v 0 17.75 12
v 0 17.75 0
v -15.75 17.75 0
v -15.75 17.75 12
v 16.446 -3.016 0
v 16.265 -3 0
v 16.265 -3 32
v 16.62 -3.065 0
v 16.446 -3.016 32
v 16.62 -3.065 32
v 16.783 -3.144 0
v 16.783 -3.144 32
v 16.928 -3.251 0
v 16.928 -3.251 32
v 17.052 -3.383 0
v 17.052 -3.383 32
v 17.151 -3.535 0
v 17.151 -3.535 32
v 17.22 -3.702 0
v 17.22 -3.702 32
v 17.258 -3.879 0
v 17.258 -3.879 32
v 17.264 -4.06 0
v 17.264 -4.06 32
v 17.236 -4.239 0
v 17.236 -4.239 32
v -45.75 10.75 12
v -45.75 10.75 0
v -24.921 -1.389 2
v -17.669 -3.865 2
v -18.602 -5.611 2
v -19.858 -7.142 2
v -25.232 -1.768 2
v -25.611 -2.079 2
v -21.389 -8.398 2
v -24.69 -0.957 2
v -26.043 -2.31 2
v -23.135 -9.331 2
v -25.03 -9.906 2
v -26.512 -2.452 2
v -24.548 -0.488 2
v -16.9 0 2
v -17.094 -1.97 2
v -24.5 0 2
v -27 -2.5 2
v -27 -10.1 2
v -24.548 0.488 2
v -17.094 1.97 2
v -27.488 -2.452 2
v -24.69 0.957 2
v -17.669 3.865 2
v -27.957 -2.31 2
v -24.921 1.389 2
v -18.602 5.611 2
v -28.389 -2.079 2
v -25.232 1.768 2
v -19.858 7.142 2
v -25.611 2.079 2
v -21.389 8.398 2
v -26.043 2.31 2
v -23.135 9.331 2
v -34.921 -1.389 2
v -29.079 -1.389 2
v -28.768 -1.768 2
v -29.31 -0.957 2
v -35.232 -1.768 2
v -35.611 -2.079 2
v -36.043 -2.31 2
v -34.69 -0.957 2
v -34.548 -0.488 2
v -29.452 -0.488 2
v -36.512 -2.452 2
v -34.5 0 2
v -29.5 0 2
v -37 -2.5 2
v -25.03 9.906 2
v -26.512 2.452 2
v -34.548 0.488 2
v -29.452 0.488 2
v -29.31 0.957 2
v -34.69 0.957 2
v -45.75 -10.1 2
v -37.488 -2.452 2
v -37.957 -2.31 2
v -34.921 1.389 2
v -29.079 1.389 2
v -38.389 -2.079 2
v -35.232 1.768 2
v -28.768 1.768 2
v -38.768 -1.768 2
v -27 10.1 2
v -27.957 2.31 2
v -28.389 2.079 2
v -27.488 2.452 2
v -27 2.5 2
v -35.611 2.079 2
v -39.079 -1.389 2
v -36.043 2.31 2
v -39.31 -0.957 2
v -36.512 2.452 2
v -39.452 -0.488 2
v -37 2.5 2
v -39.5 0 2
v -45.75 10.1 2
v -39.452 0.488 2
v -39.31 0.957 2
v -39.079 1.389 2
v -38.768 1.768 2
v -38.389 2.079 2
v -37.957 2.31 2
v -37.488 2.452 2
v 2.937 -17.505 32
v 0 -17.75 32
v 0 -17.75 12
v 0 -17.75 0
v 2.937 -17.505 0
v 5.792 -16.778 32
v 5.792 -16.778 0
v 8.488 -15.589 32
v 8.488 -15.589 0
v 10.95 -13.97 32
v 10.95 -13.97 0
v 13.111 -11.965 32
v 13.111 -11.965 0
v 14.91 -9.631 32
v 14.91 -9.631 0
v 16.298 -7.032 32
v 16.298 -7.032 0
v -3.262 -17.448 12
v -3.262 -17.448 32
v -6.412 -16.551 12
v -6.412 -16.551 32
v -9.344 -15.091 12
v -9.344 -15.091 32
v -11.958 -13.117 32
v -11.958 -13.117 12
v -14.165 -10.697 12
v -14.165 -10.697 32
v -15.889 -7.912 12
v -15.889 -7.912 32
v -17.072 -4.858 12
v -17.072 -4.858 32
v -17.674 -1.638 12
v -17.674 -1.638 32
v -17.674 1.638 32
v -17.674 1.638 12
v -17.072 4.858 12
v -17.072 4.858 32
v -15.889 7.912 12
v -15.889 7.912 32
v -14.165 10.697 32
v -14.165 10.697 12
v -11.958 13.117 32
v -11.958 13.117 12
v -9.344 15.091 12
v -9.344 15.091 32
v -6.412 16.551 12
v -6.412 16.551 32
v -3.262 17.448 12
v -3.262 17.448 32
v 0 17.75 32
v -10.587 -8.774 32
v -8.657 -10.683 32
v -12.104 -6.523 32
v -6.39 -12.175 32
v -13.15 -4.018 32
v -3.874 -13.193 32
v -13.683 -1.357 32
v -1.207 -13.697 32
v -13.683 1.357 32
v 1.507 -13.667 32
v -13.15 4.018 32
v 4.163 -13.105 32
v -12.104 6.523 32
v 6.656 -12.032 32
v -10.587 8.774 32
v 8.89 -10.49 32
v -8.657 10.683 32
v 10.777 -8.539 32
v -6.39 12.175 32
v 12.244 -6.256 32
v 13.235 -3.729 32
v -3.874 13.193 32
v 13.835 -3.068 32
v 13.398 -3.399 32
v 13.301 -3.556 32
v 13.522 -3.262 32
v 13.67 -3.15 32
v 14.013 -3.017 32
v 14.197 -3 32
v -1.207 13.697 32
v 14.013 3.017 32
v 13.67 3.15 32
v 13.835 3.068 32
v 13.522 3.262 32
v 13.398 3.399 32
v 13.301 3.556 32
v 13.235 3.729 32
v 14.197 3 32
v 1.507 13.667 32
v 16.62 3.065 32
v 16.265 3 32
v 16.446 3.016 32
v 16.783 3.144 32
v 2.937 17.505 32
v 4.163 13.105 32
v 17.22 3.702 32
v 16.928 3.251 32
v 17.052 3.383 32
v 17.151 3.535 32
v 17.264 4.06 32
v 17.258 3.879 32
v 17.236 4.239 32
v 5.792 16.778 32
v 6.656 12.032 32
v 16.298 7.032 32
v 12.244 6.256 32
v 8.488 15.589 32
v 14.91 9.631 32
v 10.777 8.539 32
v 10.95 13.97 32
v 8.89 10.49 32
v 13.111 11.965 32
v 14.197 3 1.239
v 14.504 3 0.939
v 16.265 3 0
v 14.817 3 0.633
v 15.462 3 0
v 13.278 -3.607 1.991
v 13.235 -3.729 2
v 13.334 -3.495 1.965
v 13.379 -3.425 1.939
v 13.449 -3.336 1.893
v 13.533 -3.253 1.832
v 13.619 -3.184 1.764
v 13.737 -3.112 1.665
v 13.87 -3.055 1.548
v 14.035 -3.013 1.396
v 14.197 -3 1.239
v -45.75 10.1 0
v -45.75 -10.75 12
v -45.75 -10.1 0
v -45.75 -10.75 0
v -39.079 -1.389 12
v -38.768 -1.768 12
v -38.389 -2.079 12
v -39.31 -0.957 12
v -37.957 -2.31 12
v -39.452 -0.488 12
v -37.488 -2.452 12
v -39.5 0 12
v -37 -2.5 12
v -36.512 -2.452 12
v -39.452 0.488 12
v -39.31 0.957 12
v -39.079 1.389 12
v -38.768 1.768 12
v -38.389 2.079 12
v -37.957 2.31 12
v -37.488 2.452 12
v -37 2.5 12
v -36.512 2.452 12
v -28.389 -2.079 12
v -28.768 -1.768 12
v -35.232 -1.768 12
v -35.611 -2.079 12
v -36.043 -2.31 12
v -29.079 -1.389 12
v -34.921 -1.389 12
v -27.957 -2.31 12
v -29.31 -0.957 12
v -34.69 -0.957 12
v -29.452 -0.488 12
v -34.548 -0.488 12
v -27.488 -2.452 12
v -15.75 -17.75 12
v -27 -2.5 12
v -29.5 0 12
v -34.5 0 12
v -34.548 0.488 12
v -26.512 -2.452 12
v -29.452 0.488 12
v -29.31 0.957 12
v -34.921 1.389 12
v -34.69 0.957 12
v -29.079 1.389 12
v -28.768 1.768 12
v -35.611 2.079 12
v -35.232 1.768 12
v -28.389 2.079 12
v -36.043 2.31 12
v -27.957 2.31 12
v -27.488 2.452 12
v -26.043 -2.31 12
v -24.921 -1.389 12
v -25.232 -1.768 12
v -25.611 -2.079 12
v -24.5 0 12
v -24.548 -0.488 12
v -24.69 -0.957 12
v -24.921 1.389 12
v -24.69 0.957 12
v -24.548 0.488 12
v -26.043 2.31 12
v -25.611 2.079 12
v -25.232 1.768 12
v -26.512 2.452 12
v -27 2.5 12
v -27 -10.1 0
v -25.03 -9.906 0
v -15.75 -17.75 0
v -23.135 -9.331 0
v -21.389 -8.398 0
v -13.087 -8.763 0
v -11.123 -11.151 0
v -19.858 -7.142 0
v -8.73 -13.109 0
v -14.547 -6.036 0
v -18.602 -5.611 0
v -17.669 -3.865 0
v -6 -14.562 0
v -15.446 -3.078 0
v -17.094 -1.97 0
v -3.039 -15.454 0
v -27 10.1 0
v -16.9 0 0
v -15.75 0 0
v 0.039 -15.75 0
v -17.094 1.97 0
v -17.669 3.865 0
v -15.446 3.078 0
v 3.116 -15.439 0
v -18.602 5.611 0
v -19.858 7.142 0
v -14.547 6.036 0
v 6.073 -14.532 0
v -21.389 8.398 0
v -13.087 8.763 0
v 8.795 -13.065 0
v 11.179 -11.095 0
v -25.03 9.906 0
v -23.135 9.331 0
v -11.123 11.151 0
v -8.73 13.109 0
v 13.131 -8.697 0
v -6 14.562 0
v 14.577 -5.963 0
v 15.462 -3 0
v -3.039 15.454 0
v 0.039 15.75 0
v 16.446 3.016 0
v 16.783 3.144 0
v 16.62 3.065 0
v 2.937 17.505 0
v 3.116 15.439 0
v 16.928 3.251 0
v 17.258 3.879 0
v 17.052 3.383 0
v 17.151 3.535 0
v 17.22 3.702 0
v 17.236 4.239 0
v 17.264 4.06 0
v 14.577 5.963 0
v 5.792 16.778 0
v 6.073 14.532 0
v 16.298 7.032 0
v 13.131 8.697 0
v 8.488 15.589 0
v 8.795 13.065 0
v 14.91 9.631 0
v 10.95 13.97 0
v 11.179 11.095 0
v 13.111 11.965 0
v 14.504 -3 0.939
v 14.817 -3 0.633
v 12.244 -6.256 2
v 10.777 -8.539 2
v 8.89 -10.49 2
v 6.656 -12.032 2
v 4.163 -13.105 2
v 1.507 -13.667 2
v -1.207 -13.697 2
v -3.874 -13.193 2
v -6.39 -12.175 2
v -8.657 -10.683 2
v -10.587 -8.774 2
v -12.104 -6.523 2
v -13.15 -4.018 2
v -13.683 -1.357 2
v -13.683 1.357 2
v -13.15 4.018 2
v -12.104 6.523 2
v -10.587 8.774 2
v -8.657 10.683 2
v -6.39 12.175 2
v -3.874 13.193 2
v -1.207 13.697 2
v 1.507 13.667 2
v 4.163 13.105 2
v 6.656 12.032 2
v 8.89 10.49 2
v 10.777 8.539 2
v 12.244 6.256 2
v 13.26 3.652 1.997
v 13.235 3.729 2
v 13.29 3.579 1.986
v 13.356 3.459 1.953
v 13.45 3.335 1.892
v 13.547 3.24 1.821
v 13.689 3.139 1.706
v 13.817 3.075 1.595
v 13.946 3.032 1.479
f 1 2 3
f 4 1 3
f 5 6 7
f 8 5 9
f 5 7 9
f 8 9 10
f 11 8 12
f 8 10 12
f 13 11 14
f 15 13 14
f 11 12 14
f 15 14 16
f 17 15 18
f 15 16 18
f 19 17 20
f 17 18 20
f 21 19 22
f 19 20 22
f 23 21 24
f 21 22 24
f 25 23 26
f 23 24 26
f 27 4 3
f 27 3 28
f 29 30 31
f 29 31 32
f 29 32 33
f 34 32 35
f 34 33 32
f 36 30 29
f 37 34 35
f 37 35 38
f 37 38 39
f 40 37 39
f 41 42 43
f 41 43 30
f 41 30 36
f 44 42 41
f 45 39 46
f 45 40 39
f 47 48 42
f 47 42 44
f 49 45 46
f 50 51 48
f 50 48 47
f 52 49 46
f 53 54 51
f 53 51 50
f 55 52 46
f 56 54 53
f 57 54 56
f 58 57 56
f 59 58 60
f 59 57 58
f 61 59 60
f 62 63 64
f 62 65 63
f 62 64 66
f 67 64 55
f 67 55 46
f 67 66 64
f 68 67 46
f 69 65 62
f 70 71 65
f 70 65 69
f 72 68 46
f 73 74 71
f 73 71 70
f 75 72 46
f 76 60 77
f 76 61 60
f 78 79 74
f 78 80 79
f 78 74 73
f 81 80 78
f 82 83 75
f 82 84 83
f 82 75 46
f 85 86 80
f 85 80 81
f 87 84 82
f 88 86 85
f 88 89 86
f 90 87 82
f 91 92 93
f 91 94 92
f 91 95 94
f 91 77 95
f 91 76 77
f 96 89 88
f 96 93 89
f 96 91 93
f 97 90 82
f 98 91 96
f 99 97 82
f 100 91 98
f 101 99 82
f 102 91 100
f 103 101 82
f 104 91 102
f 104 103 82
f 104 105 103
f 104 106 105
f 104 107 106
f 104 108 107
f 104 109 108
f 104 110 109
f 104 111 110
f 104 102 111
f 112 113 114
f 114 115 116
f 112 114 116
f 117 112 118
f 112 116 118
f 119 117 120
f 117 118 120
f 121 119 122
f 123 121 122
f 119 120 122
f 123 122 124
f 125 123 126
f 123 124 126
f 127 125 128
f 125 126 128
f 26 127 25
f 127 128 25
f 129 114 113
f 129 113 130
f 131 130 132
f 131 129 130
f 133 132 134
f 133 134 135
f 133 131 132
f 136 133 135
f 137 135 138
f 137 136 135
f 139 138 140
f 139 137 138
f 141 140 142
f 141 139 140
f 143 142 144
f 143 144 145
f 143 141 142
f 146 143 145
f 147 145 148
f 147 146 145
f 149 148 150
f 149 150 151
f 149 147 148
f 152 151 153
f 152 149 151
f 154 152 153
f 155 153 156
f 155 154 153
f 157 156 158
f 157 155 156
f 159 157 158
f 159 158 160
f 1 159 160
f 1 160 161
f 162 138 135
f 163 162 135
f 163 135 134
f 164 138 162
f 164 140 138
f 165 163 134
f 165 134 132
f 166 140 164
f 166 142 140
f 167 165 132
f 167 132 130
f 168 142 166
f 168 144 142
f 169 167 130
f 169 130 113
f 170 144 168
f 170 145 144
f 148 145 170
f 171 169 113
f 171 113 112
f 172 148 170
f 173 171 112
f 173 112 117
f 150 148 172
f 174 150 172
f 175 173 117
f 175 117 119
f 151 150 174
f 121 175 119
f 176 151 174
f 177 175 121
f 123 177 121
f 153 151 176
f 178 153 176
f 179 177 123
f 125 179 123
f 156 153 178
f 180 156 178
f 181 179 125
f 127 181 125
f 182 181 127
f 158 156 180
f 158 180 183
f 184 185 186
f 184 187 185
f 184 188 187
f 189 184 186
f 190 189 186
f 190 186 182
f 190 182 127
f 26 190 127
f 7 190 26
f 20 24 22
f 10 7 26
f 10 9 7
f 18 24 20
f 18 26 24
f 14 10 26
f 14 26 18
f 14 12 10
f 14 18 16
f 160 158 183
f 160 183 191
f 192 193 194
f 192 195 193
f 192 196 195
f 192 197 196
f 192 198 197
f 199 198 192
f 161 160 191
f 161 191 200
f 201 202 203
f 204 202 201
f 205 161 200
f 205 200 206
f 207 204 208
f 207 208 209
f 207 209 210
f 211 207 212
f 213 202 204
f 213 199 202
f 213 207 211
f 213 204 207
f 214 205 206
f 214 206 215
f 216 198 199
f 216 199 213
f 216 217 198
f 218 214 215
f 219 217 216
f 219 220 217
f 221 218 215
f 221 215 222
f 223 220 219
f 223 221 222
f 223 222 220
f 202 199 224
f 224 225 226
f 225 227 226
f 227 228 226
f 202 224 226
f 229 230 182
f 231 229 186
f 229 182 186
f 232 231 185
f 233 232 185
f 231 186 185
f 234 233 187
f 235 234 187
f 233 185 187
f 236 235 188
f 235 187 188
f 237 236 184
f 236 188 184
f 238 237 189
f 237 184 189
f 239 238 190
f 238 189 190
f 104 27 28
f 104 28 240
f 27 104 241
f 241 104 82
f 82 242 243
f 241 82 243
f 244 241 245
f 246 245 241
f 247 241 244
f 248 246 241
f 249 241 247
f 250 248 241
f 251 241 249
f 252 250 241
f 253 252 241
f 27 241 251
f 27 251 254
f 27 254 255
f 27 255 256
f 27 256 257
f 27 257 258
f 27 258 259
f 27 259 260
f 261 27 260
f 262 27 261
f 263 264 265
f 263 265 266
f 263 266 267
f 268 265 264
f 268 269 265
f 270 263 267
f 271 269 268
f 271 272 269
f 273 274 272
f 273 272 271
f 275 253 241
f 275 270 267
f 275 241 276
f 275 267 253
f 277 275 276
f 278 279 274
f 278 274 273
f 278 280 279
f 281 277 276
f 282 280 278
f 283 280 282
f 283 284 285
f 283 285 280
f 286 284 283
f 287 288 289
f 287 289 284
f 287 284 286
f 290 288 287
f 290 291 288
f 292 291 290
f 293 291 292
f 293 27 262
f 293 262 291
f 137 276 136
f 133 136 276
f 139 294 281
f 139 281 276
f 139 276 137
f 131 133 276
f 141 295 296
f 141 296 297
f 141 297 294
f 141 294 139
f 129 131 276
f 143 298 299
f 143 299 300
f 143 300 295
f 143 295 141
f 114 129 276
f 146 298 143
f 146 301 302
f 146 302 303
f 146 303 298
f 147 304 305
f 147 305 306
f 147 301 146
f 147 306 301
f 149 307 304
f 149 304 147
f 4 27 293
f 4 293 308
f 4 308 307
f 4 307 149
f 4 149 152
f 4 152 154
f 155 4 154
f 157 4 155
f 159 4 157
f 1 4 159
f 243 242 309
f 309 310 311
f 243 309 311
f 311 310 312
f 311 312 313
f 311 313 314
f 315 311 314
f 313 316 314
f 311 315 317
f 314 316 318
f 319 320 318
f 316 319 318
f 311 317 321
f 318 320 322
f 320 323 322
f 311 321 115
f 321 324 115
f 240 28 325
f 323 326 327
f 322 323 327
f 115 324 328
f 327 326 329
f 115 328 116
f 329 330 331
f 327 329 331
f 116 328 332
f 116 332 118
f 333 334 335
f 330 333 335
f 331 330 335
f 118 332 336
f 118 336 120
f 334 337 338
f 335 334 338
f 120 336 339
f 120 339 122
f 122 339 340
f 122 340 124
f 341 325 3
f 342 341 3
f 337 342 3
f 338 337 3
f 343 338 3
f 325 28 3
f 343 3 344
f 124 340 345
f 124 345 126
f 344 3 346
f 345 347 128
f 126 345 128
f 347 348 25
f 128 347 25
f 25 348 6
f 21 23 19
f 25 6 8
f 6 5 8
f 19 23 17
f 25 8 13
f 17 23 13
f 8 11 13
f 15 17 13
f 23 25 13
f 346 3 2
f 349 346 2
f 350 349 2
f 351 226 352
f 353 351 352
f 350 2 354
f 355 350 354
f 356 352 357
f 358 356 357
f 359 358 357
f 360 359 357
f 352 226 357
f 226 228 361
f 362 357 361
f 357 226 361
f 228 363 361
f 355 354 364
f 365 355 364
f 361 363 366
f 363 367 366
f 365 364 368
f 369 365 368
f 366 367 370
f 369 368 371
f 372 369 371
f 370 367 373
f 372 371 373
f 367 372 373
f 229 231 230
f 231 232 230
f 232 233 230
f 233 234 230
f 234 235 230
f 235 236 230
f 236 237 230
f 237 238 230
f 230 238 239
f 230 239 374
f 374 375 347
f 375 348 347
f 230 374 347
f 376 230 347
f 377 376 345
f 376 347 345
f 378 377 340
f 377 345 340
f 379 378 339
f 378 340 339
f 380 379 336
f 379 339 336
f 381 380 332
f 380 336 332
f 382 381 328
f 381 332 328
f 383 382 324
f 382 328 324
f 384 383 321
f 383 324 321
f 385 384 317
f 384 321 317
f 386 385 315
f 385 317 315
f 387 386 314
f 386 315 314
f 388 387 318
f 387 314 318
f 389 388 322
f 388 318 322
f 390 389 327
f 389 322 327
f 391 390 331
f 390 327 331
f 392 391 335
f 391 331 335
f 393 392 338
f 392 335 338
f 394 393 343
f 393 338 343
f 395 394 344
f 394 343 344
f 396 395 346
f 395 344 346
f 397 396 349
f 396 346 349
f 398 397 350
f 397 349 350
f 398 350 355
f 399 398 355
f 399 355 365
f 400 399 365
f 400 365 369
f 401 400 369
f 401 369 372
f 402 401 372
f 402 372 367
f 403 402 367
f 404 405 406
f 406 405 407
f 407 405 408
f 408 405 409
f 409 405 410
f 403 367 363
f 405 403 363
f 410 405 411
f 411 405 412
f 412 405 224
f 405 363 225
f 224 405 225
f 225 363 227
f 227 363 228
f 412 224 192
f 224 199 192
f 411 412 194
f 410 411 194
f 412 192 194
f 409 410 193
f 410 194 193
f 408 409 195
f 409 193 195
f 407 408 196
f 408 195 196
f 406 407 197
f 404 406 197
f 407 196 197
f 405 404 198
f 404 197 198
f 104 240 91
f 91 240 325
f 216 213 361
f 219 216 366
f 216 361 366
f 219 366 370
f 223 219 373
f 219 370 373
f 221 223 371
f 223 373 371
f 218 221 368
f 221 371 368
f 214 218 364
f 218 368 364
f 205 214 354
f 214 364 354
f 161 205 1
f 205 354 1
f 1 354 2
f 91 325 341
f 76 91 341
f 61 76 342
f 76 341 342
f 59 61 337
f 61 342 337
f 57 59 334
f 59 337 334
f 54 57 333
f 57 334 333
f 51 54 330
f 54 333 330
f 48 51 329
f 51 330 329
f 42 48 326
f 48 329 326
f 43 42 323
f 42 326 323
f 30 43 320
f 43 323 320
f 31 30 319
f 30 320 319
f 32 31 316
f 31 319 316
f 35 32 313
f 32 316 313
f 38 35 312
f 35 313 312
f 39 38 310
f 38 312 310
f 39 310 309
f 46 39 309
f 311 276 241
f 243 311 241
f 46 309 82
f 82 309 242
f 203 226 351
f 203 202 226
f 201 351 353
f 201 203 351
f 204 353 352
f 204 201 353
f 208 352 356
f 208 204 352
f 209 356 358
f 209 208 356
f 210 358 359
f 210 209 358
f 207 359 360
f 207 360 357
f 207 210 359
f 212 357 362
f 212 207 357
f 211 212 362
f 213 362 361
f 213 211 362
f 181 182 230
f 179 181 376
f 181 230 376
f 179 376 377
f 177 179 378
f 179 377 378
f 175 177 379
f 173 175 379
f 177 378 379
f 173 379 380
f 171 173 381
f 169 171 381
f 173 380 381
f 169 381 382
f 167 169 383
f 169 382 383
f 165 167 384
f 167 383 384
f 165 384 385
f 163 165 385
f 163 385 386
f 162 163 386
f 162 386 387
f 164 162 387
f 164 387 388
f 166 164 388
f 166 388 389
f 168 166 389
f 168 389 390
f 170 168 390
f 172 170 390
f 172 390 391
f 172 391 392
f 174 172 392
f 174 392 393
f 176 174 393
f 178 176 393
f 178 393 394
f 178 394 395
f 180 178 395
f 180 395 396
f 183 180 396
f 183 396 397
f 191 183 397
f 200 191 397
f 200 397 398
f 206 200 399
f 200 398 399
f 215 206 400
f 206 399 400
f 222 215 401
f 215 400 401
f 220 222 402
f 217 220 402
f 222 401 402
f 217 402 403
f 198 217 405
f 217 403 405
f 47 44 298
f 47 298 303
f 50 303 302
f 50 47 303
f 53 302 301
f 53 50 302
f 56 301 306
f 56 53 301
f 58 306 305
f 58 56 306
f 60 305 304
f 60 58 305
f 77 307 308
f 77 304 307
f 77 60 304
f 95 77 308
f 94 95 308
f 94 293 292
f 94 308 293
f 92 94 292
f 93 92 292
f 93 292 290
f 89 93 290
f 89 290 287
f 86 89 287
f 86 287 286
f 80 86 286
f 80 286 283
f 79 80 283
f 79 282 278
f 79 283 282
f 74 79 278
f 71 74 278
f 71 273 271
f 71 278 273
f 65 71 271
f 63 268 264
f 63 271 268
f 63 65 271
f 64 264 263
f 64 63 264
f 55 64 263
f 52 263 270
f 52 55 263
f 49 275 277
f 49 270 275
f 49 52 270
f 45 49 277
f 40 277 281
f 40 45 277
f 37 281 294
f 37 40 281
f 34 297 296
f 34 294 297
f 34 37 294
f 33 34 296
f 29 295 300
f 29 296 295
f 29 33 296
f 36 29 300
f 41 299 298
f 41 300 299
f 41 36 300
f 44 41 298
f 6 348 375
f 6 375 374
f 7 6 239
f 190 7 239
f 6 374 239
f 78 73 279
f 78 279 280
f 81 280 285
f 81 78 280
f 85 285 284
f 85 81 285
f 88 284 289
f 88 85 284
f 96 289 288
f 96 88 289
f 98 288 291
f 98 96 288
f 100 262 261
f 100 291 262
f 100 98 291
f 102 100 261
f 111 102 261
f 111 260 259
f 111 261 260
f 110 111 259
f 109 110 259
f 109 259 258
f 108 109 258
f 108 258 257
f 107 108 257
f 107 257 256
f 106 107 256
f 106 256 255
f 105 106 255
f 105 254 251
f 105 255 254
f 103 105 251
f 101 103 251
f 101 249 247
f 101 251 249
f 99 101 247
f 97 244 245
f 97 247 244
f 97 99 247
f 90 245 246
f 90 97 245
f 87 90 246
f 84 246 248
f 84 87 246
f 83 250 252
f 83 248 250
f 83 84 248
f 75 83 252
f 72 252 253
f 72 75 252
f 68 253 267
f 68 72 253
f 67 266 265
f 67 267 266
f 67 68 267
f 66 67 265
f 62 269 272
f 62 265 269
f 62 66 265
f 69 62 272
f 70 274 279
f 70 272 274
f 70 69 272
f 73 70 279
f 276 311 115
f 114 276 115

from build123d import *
from build123d.topology import SkipClean

# Parameters (mm, degrees)
ESQUISSE1_R             = 2.5
BOSS_EXTRU_1_DEPTH      = 32
CHANFREIN1_SIZE         = 2
CONG_2_R                = 1
ENL_V_MAT_EXTRU_1_DEPTH = 2
ENL_V_START             = -20
ENL_V_MAT_EXTRU_2_DEPTH = 20
ENL_V_MAT_EXTRU_3_DEPTH = 53.991744678


with BuildPart() as part:
    # Esquisse1 → Boss.-Extru.1 (new body)
    with BuildSketch(Plane.XY):
        with BuildLine():
            Line((13.4187369, 3), (17.494642037, 3))
            ThreePointArc((17.494642037, 3), (11.441426921, 13.570418195), (0, 17.75))
            Line((0, 17.75), (-45.75, 17.75))
            Line((-45.75, 17.75), (-45.75, -17.75))
            Line((-45.75, -17.75), (0, -17.75))
            ThreePointArc((0, -17.75), (11.441426921, -13.570418195), (17.494642037, -3))
            Line((17.494642037, -3), (13.4187369, -3))
            ThreePointArc((13.4187369, -3), (-13.75, 0), (13.4187369, 3))
        make_face()
        with Locations((-37, 0)):
            Circle(ESQUISSE1_R, mode=Mode.SUBTRACT)
        with Locations((-27, 0)):
            Circle(ESQUISSE1_R, mode=Mode.SUBTRACT)
    extrude(amount=BOSS_EXTRU_1_DEPTH)

    # Chanfrein1
    chanfrein1_edges = [part.edges().sort_by_distance(p)[0] for p in [
        (-13.75, 0, 0),
    ]]
    chamfer(chanfrein1_edges, length=CHANFREIN1_SIZE)

    # Congé2
    cong_2_edges = [part.edges().sort_by_distance(p)[0] for p in [
        (17.494642037, -3, 16),
        (17.494642037, 3, 16),
        (13.4187369, -3, 17),
        (13.4187369, 3, 17),
    ]]
    fillet(cong_2_edges, radius=CONG_2_R)

    # Esquisse2 → Enlèv. mat.-Extru.1 (cut)
    with BuildSketch(Plane(origin=(0, 0, 0), x_dir=(-1, 0, 0), z_dir=(0, 0, -1))):
        with BuildLine():
            Line((45.75, 10.1), (27, 10.1))
            ThreePointArc((27, 10.1), (16.9, 0), (27, -10.1))
            Line((27, -10.1), (45.75, -10.1))
            Line((45.75, -10.1), (45.75, 10.1))
        make_face()
    extrude(amount=-ENL_V_MAT_EXTRU_1_DEPTH, mode=Mode.SUBTRACT)

    # Esquisse3 → Enlèv. mat.-Extru.2 (cut)
    with SkipClean():  # the faces are left unmerged after this step: merging them gives an invalid solid
        with BuildSketch(Plane.XY.offset(32).offset(ENL_V_START)):
            with BuildLine():
                Line((0, 17.75), (-45.75, 17.75))
                Line((-45.75, 17.75), (-45.75, -17.75))
                Line((-45.75, -17.75), (0, -17.75))
                ThreePointArc((0, -17.75), (-17.75, 0), (0, 17.75))
            make_face()
        extrude(amount=ENL_V_MAT_EXTRU_2_DEPTH, mode=Mode.SUBTRACT)

    # Esquisse5 → Enlèv. mat.-Extru.3 (cut, through all)
    with SkipClean():  # the faces are left unmerged after this step: merging them gives an invalid solid
        with BuildSketch(Plane.XY.offset(12)):
            Polygon((-15.75, 17.75), (-45.75, 10.75), (-45.75, 17.75), align=None)
            Polygon((-45.75, -17.75), (-15.75, -17.75), (-45.75, -10.75), align=None)
        extrude(amount=-ENL_V_MAT_EXTRU_3_DEPTH, mode=Mode.SUBTRACT)


solid = part.part
